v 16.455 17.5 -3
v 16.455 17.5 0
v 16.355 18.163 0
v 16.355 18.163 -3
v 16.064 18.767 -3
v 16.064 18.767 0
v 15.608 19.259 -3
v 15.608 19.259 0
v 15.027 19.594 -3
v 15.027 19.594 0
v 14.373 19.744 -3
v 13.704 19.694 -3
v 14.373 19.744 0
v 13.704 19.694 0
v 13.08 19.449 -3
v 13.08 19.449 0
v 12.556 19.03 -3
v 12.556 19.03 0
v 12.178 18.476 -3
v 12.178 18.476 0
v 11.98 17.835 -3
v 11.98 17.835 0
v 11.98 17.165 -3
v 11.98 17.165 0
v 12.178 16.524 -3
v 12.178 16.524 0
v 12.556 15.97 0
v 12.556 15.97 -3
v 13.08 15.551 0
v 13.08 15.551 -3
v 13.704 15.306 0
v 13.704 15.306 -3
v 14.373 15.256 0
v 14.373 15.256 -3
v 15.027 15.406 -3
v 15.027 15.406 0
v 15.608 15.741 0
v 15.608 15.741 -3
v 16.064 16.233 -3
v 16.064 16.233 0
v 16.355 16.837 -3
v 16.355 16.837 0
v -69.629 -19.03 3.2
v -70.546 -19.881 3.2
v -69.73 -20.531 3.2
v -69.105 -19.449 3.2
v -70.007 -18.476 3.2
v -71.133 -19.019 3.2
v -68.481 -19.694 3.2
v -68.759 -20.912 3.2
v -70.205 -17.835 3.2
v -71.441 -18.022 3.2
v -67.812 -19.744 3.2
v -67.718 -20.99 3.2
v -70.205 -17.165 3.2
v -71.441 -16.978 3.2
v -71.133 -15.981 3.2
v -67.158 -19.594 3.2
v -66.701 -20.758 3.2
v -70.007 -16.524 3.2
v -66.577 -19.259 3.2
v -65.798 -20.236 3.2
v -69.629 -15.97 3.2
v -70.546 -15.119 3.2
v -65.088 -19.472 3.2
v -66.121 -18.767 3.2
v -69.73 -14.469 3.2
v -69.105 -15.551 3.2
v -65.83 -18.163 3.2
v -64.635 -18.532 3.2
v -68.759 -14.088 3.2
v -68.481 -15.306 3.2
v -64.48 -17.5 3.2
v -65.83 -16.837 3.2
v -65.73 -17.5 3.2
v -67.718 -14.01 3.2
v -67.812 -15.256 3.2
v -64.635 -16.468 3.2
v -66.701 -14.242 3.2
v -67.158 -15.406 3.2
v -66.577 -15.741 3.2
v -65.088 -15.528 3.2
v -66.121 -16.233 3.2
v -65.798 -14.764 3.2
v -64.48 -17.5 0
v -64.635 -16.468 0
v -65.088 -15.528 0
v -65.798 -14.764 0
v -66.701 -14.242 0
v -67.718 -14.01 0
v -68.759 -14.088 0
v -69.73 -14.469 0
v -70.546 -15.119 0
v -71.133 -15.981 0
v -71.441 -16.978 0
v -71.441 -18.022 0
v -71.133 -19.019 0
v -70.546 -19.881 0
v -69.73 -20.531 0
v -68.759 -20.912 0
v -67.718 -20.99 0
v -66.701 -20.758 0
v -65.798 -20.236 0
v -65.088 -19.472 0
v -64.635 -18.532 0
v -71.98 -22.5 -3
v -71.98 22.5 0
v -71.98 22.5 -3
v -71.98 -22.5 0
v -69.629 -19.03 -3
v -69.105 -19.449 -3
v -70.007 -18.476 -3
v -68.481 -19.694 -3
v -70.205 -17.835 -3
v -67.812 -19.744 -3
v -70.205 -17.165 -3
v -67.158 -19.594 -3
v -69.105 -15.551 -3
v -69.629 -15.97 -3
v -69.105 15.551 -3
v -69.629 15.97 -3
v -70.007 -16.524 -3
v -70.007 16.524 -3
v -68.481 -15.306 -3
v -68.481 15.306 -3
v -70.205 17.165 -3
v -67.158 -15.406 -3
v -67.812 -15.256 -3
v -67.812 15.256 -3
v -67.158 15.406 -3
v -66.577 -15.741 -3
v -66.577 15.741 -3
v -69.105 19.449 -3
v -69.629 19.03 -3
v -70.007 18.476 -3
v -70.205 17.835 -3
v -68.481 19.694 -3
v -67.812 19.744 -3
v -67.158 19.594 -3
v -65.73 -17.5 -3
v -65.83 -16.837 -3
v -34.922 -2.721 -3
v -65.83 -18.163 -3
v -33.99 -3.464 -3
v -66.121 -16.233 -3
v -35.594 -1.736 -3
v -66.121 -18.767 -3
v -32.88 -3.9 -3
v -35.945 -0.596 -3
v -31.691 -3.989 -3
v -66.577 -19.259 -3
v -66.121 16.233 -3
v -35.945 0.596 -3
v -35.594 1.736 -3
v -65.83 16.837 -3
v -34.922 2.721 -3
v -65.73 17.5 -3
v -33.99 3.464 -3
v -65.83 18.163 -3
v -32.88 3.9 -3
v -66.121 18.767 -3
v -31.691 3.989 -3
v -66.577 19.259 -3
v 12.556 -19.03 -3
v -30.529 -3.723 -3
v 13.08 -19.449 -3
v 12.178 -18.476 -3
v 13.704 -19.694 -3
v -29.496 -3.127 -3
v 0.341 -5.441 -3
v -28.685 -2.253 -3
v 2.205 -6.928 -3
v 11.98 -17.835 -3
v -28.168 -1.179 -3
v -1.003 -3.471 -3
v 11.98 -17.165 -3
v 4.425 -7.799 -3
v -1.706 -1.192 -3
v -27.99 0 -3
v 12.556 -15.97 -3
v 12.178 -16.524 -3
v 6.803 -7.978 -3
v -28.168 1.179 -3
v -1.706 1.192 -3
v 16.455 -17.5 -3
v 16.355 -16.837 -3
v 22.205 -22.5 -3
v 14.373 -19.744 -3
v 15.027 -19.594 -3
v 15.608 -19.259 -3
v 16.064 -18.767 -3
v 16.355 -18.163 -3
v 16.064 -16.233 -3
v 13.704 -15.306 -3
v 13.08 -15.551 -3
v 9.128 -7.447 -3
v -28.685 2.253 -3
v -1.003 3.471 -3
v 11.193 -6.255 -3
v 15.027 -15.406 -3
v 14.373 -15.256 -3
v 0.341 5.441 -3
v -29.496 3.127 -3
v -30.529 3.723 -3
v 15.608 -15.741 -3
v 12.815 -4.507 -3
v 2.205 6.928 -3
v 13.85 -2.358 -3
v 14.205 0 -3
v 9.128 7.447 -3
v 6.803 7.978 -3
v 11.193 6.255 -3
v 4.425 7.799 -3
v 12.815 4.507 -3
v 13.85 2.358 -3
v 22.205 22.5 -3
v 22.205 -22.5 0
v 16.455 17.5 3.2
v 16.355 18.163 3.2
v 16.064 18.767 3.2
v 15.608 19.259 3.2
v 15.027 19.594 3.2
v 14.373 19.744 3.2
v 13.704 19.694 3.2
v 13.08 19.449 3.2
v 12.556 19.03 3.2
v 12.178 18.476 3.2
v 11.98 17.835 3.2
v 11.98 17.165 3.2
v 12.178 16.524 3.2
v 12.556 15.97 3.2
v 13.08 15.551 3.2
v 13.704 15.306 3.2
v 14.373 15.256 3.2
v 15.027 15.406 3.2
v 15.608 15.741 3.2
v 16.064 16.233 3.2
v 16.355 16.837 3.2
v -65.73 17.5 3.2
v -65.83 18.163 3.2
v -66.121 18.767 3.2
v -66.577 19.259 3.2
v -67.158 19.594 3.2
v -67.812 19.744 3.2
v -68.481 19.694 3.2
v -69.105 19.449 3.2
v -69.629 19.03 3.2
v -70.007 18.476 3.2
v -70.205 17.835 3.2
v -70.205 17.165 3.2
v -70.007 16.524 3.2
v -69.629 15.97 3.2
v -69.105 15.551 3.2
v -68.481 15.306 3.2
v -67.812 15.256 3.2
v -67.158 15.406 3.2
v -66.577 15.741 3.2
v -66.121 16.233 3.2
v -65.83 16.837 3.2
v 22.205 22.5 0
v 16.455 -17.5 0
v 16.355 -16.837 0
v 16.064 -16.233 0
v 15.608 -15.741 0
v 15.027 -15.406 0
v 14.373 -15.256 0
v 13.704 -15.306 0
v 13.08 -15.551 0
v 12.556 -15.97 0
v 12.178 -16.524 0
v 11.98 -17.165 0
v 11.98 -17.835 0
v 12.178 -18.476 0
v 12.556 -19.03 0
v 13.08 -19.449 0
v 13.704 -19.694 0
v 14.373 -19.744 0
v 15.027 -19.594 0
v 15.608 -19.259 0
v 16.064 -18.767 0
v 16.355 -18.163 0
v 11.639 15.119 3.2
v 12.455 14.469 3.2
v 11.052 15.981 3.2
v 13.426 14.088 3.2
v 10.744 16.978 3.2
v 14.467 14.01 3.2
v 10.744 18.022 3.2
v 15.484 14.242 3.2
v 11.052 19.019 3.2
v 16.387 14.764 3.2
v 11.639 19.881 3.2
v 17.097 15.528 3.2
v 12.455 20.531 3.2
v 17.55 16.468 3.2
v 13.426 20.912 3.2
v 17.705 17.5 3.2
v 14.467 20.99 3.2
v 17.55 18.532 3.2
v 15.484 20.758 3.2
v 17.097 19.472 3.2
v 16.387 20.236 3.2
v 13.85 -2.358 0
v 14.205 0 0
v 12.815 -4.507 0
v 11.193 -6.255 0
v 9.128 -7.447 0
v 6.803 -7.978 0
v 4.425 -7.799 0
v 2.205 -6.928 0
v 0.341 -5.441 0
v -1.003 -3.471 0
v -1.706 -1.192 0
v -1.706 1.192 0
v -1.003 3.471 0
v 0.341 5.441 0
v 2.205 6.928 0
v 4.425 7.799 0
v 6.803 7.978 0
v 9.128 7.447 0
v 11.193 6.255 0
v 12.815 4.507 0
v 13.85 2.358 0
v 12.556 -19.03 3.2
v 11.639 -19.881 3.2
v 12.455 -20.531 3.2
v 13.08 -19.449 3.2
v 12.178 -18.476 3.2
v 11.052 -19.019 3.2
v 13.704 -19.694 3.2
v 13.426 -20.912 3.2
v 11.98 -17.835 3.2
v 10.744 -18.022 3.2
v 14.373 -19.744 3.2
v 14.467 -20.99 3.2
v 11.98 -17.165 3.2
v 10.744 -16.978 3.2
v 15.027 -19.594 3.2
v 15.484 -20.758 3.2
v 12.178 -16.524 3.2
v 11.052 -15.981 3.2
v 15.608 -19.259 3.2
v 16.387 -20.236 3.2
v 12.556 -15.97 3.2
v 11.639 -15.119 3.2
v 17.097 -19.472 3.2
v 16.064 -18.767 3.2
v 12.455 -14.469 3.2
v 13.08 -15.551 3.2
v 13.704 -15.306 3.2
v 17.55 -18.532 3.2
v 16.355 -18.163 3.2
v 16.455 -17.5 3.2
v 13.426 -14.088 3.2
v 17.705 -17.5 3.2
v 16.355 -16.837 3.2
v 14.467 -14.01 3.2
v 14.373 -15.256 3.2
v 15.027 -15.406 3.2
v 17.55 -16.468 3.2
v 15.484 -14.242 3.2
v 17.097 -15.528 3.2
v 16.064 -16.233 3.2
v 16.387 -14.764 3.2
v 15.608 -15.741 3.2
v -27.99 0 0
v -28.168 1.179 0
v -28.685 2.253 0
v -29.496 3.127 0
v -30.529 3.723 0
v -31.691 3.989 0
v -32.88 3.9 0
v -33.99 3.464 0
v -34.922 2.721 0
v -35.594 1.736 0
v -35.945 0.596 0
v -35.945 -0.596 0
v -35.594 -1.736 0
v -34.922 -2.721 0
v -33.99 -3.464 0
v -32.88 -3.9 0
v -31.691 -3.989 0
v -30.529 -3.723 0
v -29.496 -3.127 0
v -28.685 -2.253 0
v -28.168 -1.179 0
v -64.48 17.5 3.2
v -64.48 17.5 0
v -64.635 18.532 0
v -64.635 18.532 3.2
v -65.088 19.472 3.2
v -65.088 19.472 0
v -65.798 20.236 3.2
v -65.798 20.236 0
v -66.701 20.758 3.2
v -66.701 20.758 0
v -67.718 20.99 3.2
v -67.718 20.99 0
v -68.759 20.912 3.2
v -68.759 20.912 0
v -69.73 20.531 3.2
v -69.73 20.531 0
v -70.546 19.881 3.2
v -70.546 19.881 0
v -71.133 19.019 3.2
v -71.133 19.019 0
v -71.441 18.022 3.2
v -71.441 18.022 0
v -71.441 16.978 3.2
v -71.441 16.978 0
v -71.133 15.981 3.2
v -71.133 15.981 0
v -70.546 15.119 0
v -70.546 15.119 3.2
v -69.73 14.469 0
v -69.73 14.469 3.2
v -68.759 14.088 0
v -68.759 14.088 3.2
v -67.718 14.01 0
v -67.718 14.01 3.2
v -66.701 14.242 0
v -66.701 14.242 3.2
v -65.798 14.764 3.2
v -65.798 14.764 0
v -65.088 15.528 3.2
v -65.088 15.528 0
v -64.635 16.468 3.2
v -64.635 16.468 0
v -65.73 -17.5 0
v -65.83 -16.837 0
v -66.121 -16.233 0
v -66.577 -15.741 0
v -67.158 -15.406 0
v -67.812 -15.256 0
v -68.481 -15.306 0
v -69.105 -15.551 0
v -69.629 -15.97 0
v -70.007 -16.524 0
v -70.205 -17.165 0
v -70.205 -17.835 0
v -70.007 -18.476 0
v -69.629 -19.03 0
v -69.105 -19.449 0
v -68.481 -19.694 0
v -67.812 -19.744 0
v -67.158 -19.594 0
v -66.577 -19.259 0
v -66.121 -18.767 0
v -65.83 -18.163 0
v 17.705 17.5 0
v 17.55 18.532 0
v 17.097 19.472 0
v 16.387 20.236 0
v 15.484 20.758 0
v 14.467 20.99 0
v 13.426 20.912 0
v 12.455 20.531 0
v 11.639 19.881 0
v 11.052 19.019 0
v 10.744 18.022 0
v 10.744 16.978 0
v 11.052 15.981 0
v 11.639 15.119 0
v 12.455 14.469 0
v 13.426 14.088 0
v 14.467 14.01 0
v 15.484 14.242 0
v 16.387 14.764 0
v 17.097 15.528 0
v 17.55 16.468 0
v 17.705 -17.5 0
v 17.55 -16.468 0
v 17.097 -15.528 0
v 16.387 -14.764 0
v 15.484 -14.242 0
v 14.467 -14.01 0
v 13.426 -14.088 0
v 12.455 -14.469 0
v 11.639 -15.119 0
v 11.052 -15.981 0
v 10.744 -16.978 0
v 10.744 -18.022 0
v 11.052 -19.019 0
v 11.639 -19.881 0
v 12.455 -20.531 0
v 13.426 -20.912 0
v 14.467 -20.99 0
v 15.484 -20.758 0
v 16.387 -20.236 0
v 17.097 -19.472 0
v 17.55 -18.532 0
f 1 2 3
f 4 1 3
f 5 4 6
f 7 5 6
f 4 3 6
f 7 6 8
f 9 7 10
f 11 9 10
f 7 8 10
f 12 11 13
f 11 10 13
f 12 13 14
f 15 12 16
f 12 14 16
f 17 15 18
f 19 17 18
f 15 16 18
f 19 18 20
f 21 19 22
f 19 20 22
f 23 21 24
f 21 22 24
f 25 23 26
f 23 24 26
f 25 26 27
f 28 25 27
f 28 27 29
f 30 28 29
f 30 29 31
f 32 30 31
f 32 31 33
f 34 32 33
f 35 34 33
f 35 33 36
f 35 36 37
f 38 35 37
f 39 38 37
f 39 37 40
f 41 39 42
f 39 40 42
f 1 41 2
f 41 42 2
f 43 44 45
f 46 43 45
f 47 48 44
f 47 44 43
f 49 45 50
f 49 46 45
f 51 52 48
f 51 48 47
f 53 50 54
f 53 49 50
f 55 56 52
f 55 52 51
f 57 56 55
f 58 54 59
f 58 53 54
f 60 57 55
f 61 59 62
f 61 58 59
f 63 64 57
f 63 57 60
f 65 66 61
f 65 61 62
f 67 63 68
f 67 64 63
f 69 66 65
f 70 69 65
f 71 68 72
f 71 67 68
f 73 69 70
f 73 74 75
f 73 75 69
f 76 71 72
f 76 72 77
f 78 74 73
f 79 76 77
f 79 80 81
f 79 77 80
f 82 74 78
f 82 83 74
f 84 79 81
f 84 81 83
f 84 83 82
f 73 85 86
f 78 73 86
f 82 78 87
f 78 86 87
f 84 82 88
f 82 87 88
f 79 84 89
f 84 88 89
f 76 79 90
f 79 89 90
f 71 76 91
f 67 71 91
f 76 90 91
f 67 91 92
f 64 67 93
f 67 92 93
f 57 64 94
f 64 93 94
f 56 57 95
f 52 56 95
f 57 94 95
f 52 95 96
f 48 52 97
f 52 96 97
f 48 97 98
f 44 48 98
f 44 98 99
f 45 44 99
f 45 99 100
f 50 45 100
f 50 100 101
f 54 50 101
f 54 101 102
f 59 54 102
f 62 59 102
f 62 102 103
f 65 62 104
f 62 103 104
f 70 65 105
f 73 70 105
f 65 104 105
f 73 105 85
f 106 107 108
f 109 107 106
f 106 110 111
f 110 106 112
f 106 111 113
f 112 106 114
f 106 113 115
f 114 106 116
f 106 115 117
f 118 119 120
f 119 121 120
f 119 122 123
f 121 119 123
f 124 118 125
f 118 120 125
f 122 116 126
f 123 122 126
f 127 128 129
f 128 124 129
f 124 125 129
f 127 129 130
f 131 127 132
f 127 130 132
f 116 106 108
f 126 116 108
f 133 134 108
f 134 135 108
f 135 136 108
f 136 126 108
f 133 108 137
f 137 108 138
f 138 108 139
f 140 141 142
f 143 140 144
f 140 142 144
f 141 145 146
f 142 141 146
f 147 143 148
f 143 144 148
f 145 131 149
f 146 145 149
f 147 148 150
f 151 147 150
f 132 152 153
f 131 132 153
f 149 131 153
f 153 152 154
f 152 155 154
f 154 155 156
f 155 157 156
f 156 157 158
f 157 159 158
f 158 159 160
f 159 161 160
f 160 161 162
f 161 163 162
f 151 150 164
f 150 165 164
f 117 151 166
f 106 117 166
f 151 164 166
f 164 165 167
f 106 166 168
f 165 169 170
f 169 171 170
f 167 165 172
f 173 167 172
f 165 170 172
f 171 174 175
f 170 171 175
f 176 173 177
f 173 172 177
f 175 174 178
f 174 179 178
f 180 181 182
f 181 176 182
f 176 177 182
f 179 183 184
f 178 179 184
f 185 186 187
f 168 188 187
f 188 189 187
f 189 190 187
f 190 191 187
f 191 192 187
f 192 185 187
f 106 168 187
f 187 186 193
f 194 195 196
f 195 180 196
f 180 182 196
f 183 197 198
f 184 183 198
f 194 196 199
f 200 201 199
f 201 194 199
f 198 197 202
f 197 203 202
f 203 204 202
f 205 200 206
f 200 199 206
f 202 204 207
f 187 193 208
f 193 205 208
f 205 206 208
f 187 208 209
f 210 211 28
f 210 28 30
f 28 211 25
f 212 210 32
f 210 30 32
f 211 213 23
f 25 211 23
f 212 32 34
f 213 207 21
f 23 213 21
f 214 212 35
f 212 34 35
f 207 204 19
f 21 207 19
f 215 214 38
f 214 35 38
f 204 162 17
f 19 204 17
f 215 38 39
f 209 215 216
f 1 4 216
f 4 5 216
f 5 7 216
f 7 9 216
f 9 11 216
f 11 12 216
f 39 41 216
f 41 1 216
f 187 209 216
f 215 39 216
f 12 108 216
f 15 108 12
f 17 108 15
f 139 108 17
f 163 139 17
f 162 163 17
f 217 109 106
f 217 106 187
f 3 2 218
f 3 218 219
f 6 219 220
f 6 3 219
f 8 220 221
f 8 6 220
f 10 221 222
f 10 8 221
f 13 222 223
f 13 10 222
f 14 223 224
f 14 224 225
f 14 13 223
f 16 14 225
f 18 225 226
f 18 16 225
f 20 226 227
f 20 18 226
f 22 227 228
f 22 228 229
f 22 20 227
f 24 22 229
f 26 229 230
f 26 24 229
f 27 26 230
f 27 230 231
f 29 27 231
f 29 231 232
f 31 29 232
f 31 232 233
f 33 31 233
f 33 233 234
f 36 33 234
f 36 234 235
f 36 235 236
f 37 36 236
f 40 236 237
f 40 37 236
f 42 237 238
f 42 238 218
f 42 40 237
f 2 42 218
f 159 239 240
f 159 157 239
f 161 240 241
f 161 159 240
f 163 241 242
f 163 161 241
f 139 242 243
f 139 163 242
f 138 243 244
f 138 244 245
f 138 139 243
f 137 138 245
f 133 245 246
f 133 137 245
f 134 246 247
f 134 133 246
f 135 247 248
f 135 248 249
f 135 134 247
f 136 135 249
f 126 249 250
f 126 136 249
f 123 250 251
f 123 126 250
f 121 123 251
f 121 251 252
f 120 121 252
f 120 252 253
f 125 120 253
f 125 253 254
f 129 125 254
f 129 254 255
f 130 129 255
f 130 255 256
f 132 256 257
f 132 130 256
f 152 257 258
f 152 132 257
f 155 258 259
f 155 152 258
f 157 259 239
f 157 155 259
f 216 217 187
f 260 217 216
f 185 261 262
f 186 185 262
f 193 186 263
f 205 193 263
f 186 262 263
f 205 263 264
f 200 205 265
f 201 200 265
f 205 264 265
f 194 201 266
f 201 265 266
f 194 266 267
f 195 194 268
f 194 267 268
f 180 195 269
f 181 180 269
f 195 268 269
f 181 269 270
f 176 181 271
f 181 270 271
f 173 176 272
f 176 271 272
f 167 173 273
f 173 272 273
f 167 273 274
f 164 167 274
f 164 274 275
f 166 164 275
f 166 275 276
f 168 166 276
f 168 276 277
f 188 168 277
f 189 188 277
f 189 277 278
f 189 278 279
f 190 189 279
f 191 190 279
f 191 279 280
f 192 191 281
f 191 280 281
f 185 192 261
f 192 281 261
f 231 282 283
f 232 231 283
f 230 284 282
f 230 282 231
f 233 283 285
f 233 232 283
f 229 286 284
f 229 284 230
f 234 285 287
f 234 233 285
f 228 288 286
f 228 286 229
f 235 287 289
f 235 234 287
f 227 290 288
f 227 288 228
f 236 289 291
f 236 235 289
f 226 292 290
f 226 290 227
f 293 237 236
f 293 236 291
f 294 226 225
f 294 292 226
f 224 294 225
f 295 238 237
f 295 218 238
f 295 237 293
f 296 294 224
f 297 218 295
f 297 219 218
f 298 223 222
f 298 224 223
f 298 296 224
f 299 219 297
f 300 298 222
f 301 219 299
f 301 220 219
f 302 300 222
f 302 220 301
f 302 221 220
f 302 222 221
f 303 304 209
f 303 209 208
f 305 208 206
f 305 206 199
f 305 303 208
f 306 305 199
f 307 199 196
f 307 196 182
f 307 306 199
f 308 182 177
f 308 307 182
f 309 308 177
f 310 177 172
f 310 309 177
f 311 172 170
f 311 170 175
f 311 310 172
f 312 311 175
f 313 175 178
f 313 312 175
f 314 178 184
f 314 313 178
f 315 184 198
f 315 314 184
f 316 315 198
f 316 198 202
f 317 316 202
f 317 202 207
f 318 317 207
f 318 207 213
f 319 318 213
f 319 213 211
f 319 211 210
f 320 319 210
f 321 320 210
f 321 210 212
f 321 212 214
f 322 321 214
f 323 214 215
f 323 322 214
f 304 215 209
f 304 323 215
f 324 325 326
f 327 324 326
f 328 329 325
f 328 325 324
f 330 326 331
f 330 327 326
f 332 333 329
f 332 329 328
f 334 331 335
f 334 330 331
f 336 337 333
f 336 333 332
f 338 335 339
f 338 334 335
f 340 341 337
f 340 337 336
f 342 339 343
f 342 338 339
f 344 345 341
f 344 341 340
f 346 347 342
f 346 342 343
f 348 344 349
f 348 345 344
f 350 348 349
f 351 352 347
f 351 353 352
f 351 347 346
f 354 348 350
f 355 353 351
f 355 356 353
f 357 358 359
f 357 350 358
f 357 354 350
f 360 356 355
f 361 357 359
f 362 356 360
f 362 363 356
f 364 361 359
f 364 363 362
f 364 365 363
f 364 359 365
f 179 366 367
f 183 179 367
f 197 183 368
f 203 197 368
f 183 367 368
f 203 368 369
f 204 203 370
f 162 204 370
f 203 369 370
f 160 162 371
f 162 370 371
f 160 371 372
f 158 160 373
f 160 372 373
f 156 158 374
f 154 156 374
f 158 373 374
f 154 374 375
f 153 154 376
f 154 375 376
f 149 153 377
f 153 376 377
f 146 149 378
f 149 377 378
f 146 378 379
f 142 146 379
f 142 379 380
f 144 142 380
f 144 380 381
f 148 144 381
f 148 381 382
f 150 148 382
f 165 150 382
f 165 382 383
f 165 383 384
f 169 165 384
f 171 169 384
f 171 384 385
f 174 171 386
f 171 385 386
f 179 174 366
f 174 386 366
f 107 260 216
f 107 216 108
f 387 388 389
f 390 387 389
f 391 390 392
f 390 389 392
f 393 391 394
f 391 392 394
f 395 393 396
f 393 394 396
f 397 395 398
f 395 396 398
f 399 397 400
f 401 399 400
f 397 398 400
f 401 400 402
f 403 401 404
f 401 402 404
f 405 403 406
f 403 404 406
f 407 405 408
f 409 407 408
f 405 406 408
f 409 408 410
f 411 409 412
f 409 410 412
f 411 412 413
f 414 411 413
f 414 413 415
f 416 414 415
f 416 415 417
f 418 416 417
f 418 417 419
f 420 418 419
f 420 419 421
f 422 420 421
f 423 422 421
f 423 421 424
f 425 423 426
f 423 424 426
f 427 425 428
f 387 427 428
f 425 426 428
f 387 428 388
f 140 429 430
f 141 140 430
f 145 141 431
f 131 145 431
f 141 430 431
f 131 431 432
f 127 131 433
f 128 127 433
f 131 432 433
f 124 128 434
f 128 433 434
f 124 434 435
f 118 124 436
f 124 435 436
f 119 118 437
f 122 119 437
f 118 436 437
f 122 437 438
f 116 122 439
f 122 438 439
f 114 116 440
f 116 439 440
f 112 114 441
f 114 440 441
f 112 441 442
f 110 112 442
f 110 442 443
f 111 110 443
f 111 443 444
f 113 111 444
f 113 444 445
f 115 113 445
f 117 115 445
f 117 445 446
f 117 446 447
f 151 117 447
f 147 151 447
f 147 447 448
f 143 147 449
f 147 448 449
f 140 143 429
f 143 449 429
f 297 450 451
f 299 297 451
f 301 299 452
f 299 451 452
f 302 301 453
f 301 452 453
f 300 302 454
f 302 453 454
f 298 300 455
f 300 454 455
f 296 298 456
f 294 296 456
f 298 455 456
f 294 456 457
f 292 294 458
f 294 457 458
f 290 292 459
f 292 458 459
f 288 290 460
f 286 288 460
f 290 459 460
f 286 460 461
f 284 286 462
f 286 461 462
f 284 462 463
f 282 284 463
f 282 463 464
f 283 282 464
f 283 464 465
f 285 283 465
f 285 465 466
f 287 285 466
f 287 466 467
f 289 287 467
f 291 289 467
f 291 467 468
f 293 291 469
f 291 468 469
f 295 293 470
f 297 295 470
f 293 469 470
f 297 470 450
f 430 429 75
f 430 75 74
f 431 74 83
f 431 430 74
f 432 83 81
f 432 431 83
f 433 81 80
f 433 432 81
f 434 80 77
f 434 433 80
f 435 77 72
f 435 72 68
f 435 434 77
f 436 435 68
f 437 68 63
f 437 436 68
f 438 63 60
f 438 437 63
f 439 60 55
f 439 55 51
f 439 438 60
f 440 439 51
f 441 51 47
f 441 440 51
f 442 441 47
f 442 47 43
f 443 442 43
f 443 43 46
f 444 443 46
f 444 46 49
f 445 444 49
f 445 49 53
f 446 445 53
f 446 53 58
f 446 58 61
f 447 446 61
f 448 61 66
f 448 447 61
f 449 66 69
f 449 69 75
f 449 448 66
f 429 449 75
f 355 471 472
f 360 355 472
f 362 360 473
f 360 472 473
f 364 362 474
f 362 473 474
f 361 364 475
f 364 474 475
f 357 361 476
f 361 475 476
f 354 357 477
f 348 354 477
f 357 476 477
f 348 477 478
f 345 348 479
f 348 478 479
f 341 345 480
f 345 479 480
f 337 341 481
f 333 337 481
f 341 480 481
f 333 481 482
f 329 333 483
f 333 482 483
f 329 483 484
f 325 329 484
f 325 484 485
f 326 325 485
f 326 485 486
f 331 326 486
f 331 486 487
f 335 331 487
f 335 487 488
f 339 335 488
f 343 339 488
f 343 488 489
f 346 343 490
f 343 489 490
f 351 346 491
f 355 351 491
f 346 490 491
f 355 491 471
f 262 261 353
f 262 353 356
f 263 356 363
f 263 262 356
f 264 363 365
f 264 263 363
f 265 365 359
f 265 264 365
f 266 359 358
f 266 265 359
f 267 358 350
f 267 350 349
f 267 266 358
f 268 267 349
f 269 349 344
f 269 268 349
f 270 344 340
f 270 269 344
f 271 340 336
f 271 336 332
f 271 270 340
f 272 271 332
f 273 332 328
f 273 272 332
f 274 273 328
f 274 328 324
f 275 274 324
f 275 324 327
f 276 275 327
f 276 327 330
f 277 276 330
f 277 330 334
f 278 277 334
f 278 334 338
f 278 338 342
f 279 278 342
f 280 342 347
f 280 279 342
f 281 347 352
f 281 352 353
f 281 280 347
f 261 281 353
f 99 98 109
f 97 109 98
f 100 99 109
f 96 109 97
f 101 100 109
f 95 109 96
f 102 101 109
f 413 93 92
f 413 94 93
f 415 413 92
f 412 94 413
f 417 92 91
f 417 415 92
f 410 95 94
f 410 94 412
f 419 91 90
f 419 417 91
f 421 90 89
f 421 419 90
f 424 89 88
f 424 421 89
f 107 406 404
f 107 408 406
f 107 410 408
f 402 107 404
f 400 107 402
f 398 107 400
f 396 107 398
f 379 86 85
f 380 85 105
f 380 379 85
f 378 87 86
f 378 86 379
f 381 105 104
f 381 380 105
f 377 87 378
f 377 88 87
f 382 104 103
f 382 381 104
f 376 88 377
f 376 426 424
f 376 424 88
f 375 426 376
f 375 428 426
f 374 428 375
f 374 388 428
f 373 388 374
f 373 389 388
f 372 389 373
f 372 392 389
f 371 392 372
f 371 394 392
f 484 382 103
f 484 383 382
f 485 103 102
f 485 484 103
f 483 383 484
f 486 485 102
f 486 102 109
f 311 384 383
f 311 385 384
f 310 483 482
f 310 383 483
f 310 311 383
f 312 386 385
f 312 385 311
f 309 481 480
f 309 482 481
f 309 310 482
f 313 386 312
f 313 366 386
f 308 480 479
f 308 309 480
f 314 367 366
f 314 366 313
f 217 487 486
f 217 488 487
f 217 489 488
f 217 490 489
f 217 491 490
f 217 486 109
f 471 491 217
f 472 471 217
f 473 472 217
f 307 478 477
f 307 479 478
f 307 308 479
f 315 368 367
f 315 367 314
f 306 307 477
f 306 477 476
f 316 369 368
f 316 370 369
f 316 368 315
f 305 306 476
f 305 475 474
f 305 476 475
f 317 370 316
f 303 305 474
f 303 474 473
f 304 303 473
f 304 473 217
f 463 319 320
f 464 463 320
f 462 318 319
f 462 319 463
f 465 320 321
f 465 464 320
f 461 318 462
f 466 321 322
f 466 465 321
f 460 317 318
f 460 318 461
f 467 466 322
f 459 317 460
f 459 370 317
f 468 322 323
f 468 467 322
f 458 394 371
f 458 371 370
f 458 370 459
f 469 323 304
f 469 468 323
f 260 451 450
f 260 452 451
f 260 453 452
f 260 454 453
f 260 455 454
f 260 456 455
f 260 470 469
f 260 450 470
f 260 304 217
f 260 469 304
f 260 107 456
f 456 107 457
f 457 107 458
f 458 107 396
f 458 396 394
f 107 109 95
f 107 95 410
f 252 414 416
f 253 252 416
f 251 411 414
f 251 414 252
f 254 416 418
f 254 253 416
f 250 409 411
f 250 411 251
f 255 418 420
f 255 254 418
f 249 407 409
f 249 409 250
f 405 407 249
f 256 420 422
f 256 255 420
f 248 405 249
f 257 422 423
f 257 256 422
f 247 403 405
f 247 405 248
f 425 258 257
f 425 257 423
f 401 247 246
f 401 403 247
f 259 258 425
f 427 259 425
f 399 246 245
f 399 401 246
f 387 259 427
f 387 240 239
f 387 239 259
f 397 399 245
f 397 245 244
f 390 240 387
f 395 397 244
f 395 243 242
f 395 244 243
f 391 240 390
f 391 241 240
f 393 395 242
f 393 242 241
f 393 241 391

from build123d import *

# Parameters (mm, degrees)
F0_R     = 3.5
F0_R_2   = 4
F0_R_3   = 2.25
F1_DEPTH = 3
F2_DEPTH = 3.2


with BuildPart() as f1:
    # F0 (on Top) → F1 (new body)
    with BuildSketch(Plane.XY):
        Polygon((-1.795, -22.5), (-1.795, 9.1e-09), (-1.795, 22.5), (-71.98, 22.5), (-71.98, -22.5), align=None)
        with Locations((-67.98, -17.5)):
            Circle(F0_R, mode=Mode.SUBTRACT)
        with Locations((-31.99, 0)):
            Circle(F0_R_2, mode=Mode.SUBTRACT)
        with Locations((-67.98, 17.5)):
            Circle(F0_R, mode=Mode.SUBTRACT)
        Polygon((-1.795, 22.5), (-1.795, 9.1e-09), (-1.795, -22.5), (22.205, -22.5), (22.205, 22.5), align=None)
        with Locations((14.205, -17.5)):
            Circle(F0_R, mode=Mode.SUBTRACT)
        with BuildLine():
            ThreePointArc((-1.795, 9.1e-09), (6.2050000046, 8), (14.205, 0))
            ThreePointArc((14.205, 0), (6.2049999954, -8), (-1.795, 9.1e-09))
        make_face(mode=Mode.SUBTRACT)
        with Locations((14.205, 17.5)):
            Circle(F0_R, mode=Mode.SUBTRACT)
        with Locations((-67.98, 17.5)):
            Circle(F0_R)
        with Locations((-67.98, 17.5)):
            Circle(F0_R_3, mode=Mode.SUBTRACT)
        with Locations((-67.98, -17.5)):
            Circle(F0_R)
        with Locations((-67.98, -17.5)):
            Circle(F0_R_3, mode=Mode.SUBTRACT)
        with Locations((14.205, -17.5)):
            Circle(F0_R)
        with Locations((14.205, -17.5)):
            Circle(F0_R_3, mode=Mode.SUBTRACT)
        with Locations((14.205, 17.5)):
            Circle(F0_R)
        with Locations((14.205, 17.5)):
            Circle(F0_R_3, mode=Mode.SUBTRACT)
    extrude(amount=-F1_DEPTH)

    # F0 (on Top) → F2 (join)
    with BuildSketch(Plane.XY):
        with Locations((-67.98, 17.5)):
            Circle(F0_R)
        with Locations((-67.98, 17.5)):
            Circle(F0_R_3, mode=Mode.SUBTRACT)
        with Locations((-67.98, -17.5)):
            Circle(F0_R)
        with Locations((-67.98, -17.5)):
            Circle(F0_R_3, mode=Mode.SUBTRACT)
        with Locations((14.205, -17.5)):
            Circle(F0_R)
        with Locations((14.205, -17.5)):
            Circle(F0_R_3, mode=Mode.SUBTRACT)
        with Locations((14.205, 17.5)):
            Circle(F0_R)
        with Locations((14.205, 17.5)):
            Circle(F0_R_3, mode=Mode.SUBTRACT)
    extrude(amount=F2_DEPTH)


solid = f1.part
